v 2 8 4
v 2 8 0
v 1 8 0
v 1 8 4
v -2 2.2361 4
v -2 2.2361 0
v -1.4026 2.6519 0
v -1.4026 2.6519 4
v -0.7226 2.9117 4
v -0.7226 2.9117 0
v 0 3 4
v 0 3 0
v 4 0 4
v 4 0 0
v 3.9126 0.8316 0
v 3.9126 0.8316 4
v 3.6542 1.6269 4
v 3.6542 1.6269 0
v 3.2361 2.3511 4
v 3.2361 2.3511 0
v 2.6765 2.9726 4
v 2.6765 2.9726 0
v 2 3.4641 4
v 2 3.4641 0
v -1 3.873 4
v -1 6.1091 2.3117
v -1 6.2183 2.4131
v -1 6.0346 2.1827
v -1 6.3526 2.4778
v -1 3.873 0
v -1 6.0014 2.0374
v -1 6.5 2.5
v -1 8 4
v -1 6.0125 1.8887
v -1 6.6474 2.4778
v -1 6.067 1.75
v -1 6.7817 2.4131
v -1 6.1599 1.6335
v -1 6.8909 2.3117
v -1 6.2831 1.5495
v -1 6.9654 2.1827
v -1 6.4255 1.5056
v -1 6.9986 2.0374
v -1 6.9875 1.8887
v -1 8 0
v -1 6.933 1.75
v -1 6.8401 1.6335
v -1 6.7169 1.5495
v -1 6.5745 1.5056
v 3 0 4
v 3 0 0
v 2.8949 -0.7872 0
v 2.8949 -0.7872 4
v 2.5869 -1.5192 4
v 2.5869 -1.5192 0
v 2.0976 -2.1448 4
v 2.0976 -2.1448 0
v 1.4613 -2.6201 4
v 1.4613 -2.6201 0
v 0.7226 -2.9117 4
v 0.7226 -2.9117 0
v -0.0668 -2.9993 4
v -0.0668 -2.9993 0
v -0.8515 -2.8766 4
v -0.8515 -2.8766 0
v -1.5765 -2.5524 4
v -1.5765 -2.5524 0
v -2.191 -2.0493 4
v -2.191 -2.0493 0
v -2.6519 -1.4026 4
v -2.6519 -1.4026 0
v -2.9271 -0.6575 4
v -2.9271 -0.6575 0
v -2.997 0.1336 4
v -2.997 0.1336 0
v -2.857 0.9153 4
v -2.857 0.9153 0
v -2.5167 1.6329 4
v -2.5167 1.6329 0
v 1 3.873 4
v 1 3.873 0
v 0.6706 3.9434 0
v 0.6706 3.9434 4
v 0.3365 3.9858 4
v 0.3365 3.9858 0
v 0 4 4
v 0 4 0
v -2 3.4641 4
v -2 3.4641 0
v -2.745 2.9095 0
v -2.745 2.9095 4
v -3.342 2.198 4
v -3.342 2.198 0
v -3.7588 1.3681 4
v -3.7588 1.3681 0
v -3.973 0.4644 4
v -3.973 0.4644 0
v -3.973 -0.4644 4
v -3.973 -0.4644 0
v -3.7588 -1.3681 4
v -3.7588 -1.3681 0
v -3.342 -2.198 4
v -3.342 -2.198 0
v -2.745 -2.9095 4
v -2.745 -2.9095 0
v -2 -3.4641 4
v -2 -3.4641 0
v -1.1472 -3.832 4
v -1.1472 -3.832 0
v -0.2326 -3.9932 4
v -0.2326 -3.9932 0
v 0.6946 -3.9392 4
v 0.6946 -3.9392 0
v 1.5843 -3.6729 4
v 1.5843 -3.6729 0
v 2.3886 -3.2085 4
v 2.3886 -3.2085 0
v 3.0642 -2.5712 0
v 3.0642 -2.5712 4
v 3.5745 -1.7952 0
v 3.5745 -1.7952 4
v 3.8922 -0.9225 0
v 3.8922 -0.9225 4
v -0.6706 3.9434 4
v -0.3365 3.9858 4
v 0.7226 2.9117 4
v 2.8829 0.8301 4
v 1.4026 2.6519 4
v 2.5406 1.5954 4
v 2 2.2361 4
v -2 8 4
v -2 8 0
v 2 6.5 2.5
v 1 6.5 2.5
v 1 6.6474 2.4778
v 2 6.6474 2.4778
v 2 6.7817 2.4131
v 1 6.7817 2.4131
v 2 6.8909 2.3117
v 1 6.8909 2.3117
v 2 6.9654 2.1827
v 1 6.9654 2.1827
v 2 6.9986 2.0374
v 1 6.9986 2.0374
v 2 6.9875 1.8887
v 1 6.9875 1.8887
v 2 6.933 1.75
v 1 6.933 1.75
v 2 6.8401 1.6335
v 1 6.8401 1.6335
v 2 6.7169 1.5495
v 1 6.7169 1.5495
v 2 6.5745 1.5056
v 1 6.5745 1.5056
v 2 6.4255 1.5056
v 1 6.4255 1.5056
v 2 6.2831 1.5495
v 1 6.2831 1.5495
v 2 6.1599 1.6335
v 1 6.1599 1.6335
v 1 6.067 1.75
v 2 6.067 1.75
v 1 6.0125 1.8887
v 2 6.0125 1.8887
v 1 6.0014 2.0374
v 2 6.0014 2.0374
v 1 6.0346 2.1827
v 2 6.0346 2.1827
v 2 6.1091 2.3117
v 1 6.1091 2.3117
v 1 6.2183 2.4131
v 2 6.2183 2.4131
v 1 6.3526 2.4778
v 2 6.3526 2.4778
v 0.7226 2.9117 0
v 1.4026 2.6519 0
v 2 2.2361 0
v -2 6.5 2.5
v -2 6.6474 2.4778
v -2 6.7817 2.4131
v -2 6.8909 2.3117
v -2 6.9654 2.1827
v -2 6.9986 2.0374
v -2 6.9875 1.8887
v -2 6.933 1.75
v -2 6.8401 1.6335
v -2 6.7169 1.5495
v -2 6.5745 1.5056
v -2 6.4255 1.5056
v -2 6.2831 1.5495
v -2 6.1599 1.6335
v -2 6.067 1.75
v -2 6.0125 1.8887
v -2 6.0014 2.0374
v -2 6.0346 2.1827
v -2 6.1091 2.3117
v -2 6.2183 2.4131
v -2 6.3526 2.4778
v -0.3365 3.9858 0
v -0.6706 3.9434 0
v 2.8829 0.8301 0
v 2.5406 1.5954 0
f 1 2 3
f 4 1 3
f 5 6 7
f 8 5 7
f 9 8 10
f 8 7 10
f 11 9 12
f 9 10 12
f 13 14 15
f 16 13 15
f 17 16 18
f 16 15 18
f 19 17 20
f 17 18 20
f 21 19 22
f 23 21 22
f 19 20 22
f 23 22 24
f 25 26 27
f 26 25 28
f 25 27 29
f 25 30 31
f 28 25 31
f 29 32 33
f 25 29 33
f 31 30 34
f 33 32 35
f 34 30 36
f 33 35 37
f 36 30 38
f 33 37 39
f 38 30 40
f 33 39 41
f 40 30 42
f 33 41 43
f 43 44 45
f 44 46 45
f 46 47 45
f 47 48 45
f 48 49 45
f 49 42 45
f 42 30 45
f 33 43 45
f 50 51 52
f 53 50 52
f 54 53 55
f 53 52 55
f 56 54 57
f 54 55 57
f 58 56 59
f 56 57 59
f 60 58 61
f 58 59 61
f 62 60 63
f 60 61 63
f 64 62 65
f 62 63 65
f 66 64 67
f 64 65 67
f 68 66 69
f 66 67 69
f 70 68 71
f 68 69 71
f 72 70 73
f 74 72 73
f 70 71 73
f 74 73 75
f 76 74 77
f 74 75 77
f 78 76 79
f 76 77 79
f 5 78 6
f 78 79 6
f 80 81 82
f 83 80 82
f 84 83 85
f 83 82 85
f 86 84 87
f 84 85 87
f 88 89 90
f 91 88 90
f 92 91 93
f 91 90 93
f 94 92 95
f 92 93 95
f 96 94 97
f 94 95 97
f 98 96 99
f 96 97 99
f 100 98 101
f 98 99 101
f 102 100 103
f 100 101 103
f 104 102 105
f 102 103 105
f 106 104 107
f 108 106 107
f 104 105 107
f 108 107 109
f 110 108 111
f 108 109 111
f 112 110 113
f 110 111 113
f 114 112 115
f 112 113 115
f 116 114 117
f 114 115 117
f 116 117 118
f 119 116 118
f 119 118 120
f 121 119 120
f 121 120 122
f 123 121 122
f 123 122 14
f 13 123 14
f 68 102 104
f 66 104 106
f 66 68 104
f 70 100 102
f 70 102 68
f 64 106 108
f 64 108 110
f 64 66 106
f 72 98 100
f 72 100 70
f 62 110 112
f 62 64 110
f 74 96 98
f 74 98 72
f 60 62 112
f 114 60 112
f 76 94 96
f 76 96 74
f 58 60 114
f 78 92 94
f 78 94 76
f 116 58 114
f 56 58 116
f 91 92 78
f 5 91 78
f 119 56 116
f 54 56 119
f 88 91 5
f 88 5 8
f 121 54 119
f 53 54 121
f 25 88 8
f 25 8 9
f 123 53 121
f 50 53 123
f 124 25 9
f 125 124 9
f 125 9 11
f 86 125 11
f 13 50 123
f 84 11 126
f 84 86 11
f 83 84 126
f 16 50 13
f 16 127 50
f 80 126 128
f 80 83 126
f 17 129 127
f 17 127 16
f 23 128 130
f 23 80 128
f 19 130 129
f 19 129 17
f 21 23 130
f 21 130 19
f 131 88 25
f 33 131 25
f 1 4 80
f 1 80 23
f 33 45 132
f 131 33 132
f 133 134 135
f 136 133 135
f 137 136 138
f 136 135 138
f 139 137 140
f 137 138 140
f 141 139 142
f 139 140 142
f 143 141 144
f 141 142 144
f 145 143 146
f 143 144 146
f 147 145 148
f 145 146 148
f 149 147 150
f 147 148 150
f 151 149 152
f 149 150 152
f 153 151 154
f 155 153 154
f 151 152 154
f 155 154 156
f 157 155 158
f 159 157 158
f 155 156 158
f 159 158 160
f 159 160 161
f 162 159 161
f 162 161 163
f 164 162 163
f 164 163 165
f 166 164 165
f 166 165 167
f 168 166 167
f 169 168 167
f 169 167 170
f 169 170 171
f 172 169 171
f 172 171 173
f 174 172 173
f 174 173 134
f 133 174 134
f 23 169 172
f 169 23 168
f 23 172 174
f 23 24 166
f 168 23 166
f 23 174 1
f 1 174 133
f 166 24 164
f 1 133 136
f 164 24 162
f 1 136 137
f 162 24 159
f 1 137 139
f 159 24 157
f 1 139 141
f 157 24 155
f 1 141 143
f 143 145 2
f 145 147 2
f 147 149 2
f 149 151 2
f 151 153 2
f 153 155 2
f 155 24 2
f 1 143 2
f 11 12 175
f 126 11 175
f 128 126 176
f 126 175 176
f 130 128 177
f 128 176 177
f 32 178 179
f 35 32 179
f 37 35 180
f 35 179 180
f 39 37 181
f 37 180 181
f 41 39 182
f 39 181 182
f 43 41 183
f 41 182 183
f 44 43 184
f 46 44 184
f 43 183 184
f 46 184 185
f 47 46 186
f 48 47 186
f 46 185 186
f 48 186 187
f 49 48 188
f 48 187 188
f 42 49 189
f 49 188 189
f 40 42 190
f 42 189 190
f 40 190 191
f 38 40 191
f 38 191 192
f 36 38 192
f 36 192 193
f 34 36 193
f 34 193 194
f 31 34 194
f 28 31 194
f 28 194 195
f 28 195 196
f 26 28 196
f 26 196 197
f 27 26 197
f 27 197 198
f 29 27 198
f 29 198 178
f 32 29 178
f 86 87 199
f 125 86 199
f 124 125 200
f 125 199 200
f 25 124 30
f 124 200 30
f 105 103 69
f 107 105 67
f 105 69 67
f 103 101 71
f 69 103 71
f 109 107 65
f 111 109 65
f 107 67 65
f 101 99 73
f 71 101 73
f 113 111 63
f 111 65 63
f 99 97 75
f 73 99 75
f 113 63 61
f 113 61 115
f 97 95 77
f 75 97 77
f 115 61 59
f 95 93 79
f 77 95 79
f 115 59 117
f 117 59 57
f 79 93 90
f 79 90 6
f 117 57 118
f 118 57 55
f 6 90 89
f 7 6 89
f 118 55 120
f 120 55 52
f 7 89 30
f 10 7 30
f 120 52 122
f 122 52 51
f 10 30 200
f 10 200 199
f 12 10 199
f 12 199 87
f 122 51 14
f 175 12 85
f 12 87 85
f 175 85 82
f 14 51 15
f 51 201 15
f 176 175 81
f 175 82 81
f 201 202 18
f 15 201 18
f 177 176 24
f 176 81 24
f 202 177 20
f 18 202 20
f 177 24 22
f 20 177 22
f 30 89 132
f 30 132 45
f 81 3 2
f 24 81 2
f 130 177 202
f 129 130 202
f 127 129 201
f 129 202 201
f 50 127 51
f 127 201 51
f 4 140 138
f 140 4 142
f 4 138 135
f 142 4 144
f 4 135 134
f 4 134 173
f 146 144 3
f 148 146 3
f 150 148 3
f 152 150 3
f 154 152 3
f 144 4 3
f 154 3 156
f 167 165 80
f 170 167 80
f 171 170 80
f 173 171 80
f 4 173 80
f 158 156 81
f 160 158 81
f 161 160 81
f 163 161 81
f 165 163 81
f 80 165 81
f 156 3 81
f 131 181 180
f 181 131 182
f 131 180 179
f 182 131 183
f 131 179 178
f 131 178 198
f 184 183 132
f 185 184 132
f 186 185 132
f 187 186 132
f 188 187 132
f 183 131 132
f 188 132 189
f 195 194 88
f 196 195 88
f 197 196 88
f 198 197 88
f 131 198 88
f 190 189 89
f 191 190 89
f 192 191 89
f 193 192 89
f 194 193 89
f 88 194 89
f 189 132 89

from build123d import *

# Parameters (mm, degrees)
EXTRUDE_4_DEPTH     = 4
SKETCH_5_R          = 0.5
CUT_EXTRUDE_2_DEPTH = 4


with BuildPart() as part:
    # 草图1 → 凸台-拉伸4 (new body)
    with BuildSketch(Plane.XY):
        with BuildLine():
            Line((2, 3.464101615), (2, 2.236067977))
            ThreePointArc((2, 2.236067977), (2.738612788, 1.224744871), (3, 0))
            ThreePointArc((3, 0), (-1.224744871, -2.738612788), (-2, 2.236067977))
            Line((-2, 2.236067977), (-2, 3.464101615))
            ThreePointArc((-2, 3.464101615), (-2, -3.464101615), (4, 0))
            ThreePointArc((4, 0), (3.464101615, 2), (2, 3.464101615))
        make_face()
        with BuildLine():
            Line((1, 3), (0, 3))
            ThreePointArc((0, 3), (1.070466269, 2.802517077), (2, 2.236067977))
            Line((2, 2.236067977), (2, 3.464101615))
            ThreePointArc((2, 3.464101615), (1.513867916, 3.702459174), (1, 3.872983346))
            Line((1, 3.872983346), (1, 3))
        make_face()
        with BuildLine():
            ThreePointArc((-2, 2.236067977), (-1.070466269, 2.802517077), (0, 3))
            Line((0, 3), (-1, 3))
            Line((-1, 3), (-1, 3.872983346))
            ThreePointArc((-1, 3.872983346), (-1.513867916, 3.702459174), (-2, 3.464101615))
            Line((-2, 3.464101615), (-2, 2.236067977))
        make_face()
        with BuildLine():
            Line((-1, 3), (0, 3))
            Line((0, 3), (0, 4))
            ThreePointArc((0, 4), (-0.50401717, 3.968118785), (-1, 3.872983346))
            Line((-1, 3.872983346), (-1, 3))
        make_face()
        with BuildLine():
            Line((0, 4), (0, 3))
            Line((0, 3), (1, 3))
            Line((1, 3), (1, 3.872983346))
            ThreePointArc((1, 3.872983346), (0.50401717, 3.968118785), (0, 4))
        make_face()
        with BuildLine():
            Line((1, 8), (1, 3.872983346))
            ThreePointArc((1, 3.872983346), (1.513867916, 3.702459174), (2, 3.464101615))
            Line((2, 3.464101615), (2, 8))
            Line((2, 8), (1, 8))
        make_face()
        with BuildLine():
            ThreePointArc((-2, 3.464101615), (-1.513867916, 3.702459174), (-1, 3.872983346))
            Line((-1, 3.872983346), (-1, 8))
            Line((-1, 8), (-2, 8))
            Line((-2, 8), (-2, 3.464101615))
        make_face()
    extrude(amount=EXTRUDE_4_DEPTH)

    # 草图5 → 切除-拉伸2 (cut)
    with BuildSketch(Plane.ZY.offset(2)):
        with Locations((2, 6.5)):
            Circle(SKETCH_5_R)
    extrude(amount=-CUT_EXTRUDE_2_DEPTH, mode=Mode.SUBTRACT)


solid = part.part
